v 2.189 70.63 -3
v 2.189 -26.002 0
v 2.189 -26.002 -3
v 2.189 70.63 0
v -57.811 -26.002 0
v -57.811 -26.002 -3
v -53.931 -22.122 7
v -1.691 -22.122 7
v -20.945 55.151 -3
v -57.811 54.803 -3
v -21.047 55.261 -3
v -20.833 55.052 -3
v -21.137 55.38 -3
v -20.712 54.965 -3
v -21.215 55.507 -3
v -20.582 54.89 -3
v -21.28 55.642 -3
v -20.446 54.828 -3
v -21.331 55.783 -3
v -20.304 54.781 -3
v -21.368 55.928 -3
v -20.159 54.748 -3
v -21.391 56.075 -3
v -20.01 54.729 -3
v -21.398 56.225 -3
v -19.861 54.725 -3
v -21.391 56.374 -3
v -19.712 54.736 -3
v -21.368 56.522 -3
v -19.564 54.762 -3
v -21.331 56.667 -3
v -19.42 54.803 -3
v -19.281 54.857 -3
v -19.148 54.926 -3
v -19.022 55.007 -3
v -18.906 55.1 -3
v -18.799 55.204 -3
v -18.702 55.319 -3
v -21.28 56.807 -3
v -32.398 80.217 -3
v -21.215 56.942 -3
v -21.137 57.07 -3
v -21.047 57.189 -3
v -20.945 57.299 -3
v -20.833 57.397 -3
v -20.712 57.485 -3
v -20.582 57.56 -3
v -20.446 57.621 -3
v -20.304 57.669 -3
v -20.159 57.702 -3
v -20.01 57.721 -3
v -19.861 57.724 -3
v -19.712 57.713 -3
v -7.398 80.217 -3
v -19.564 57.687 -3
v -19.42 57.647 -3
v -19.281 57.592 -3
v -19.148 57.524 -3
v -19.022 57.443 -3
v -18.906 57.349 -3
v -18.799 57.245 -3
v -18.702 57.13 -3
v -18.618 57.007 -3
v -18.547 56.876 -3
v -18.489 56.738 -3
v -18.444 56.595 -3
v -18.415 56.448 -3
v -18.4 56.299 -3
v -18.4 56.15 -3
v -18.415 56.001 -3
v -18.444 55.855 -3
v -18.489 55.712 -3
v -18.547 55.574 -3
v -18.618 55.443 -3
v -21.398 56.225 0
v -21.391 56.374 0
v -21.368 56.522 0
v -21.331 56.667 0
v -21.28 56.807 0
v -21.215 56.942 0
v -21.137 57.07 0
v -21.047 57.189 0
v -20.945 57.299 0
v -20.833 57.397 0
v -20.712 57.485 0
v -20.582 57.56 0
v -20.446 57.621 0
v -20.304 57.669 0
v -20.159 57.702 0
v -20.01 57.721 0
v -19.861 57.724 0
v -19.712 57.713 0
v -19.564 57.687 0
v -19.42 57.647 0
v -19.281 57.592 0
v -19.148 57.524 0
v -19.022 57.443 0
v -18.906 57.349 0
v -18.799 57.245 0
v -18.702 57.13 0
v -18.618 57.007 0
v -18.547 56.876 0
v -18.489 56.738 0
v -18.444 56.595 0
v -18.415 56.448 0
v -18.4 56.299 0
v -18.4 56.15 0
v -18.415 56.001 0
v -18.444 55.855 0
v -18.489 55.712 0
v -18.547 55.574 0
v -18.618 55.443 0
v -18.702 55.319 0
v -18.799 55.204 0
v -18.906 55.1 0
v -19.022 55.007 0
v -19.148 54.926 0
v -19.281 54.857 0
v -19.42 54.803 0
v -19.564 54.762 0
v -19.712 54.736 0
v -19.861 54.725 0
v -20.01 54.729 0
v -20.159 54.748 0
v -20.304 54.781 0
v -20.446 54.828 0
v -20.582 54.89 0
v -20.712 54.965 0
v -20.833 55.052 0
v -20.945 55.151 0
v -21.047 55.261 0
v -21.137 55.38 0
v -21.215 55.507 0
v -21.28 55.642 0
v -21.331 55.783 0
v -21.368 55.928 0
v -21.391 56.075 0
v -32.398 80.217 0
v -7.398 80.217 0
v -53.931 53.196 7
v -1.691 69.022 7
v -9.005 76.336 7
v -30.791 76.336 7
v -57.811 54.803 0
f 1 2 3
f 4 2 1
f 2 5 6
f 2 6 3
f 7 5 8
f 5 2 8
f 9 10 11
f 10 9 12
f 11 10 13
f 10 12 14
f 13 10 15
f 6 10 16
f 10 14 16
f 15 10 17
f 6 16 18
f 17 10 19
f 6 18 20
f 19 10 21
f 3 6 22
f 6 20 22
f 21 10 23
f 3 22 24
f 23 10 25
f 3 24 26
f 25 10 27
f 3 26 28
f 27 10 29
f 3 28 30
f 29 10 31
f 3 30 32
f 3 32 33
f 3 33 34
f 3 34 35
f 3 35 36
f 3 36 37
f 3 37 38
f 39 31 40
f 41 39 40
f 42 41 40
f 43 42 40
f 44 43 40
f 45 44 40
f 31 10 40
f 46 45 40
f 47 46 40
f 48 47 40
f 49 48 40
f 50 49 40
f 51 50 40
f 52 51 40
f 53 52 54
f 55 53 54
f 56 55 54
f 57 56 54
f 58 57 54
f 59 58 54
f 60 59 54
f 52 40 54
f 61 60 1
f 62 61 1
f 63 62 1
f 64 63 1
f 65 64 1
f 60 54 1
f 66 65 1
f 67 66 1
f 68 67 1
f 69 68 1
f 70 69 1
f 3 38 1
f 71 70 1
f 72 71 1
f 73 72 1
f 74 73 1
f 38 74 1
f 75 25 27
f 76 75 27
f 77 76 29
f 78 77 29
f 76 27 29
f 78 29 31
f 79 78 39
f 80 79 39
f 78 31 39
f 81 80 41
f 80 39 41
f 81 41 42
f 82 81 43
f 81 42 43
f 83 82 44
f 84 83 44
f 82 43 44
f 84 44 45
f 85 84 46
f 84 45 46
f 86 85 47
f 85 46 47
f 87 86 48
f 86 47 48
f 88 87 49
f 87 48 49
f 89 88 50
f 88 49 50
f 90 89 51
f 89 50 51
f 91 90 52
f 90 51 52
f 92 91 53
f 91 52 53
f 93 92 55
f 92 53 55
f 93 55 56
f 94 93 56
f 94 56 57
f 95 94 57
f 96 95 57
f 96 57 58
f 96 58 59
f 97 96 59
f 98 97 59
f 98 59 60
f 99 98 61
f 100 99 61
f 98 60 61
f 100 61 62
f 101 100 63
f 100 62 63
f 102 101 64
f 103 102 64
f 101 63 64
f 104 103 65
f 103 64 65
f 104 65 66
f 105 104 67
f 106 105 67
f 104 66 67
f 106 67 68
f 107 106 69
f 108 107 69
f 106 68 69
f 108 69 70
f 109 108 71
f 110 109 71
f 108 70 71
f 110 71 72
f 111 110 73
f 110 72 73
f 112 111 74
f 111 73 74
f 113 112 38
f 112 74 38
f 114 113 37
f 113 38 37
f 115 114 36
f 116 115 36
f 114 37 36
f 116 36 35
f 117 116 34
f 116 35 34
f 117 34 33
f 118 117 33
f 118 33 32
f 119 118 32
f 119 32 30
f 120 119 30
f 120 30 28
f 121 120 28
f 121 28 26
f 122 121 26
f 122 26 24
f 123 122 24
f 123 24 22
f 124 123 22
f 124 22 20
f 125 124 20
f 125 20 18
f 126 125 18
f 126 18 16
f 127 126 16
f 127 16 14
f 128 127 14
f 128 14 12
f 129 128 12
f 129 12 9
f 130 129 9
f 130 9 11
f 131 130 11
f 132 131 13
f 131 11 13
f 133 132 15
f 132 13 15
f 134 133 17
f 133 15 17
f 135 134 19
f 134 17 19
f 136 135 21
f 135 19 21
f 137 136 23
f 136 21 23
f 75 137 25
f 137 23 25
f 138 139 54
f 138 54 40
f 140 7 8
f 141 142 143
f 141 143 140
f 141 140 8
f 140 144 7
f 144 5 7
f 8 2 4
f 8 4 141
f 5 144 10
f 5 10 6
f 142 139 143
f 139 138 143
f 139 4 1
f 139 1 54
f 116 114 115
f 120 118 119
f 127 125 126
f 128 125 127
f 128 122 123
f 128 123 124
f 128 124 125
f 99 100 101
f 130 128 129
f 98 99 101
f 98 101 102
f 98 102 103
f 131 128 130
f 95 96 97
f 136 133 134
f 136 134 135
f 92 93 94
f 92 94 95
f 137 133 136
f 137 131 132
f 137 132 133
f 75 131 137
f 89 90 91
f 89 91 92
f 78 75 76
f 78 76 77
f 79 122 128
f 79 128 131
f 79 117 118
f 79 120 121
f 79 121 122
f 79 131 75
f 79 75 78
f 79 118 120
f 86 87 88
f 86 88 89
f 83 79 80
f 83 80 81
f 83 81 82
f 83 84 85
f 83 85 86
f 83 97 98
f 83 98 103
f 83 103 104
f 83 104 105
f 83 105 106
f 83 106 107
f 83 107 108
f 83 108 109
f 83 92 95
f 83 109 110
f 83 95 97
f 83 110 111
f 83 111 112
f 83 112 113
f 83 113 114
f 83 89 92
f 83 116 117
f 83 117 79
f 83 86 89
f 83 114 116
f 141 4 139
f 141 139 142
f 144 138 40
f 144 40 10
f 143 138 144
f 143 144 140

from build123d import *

# Parameters (mm, degrees)
BOSS_EXTRUDE1_DEPTH           = 7
BOSS_EXTRUDE1_TAPER           = 29
BOSS_EXTRUDE1_OTHER_WAY_DEPTH = 3
SKETCH2_R                     = 1.5
CUT_EXTRUDE1_DEPTH            = 3


with BuildPart() as part:
    # Sketch1 → Boss-Extrude1 (new body)
    with BuildSketch(Plane.XY):
        Polygon((-57.811201834, -26.002477708), (2.188798166, -26.002477708), (2.188798166, 70.629617347), (-7.398088721, 80.216504233), (-32.398088721, 80.216504233), (-57.811201834, 54.80339112), align=None)
    extrude(amount=BOSS_EXTRUDE1_DEPTH, taper=BOSS_EXTRUDE1_TAPER)

    # Sketch1 → Boss-Extrude1 other way (add)
    with BuildSketch(Plane.XY):
        Polygon((-57.811201834, -26.002477708), (2.188798166, -26.002477708), (2.188798166, 70.629617347), (-7.398088721, 80.216504233), (-32.398088721, 80.216504233), (-57.811201834, 54.80339112), align=None)
    extrude(amount=-BOSS_EXTRUDE1_OTHER_WAY_DEPTH)

    # Sketch2 → Cut-Extrude1 (cut)
    with BuildSketch(Plane(origin=(0, 0, -3), x_dir=(-1, 0, 0), z_dir=(0, 0, -1))):
        with Locations((19.898088721, 56.224723903)):
            Circle(SKETCH2_R)
    extrude(amount=-CUT_EXTRUDE1_DEPTH, mode=Mode.SUBTRACT)


solid = part.part
